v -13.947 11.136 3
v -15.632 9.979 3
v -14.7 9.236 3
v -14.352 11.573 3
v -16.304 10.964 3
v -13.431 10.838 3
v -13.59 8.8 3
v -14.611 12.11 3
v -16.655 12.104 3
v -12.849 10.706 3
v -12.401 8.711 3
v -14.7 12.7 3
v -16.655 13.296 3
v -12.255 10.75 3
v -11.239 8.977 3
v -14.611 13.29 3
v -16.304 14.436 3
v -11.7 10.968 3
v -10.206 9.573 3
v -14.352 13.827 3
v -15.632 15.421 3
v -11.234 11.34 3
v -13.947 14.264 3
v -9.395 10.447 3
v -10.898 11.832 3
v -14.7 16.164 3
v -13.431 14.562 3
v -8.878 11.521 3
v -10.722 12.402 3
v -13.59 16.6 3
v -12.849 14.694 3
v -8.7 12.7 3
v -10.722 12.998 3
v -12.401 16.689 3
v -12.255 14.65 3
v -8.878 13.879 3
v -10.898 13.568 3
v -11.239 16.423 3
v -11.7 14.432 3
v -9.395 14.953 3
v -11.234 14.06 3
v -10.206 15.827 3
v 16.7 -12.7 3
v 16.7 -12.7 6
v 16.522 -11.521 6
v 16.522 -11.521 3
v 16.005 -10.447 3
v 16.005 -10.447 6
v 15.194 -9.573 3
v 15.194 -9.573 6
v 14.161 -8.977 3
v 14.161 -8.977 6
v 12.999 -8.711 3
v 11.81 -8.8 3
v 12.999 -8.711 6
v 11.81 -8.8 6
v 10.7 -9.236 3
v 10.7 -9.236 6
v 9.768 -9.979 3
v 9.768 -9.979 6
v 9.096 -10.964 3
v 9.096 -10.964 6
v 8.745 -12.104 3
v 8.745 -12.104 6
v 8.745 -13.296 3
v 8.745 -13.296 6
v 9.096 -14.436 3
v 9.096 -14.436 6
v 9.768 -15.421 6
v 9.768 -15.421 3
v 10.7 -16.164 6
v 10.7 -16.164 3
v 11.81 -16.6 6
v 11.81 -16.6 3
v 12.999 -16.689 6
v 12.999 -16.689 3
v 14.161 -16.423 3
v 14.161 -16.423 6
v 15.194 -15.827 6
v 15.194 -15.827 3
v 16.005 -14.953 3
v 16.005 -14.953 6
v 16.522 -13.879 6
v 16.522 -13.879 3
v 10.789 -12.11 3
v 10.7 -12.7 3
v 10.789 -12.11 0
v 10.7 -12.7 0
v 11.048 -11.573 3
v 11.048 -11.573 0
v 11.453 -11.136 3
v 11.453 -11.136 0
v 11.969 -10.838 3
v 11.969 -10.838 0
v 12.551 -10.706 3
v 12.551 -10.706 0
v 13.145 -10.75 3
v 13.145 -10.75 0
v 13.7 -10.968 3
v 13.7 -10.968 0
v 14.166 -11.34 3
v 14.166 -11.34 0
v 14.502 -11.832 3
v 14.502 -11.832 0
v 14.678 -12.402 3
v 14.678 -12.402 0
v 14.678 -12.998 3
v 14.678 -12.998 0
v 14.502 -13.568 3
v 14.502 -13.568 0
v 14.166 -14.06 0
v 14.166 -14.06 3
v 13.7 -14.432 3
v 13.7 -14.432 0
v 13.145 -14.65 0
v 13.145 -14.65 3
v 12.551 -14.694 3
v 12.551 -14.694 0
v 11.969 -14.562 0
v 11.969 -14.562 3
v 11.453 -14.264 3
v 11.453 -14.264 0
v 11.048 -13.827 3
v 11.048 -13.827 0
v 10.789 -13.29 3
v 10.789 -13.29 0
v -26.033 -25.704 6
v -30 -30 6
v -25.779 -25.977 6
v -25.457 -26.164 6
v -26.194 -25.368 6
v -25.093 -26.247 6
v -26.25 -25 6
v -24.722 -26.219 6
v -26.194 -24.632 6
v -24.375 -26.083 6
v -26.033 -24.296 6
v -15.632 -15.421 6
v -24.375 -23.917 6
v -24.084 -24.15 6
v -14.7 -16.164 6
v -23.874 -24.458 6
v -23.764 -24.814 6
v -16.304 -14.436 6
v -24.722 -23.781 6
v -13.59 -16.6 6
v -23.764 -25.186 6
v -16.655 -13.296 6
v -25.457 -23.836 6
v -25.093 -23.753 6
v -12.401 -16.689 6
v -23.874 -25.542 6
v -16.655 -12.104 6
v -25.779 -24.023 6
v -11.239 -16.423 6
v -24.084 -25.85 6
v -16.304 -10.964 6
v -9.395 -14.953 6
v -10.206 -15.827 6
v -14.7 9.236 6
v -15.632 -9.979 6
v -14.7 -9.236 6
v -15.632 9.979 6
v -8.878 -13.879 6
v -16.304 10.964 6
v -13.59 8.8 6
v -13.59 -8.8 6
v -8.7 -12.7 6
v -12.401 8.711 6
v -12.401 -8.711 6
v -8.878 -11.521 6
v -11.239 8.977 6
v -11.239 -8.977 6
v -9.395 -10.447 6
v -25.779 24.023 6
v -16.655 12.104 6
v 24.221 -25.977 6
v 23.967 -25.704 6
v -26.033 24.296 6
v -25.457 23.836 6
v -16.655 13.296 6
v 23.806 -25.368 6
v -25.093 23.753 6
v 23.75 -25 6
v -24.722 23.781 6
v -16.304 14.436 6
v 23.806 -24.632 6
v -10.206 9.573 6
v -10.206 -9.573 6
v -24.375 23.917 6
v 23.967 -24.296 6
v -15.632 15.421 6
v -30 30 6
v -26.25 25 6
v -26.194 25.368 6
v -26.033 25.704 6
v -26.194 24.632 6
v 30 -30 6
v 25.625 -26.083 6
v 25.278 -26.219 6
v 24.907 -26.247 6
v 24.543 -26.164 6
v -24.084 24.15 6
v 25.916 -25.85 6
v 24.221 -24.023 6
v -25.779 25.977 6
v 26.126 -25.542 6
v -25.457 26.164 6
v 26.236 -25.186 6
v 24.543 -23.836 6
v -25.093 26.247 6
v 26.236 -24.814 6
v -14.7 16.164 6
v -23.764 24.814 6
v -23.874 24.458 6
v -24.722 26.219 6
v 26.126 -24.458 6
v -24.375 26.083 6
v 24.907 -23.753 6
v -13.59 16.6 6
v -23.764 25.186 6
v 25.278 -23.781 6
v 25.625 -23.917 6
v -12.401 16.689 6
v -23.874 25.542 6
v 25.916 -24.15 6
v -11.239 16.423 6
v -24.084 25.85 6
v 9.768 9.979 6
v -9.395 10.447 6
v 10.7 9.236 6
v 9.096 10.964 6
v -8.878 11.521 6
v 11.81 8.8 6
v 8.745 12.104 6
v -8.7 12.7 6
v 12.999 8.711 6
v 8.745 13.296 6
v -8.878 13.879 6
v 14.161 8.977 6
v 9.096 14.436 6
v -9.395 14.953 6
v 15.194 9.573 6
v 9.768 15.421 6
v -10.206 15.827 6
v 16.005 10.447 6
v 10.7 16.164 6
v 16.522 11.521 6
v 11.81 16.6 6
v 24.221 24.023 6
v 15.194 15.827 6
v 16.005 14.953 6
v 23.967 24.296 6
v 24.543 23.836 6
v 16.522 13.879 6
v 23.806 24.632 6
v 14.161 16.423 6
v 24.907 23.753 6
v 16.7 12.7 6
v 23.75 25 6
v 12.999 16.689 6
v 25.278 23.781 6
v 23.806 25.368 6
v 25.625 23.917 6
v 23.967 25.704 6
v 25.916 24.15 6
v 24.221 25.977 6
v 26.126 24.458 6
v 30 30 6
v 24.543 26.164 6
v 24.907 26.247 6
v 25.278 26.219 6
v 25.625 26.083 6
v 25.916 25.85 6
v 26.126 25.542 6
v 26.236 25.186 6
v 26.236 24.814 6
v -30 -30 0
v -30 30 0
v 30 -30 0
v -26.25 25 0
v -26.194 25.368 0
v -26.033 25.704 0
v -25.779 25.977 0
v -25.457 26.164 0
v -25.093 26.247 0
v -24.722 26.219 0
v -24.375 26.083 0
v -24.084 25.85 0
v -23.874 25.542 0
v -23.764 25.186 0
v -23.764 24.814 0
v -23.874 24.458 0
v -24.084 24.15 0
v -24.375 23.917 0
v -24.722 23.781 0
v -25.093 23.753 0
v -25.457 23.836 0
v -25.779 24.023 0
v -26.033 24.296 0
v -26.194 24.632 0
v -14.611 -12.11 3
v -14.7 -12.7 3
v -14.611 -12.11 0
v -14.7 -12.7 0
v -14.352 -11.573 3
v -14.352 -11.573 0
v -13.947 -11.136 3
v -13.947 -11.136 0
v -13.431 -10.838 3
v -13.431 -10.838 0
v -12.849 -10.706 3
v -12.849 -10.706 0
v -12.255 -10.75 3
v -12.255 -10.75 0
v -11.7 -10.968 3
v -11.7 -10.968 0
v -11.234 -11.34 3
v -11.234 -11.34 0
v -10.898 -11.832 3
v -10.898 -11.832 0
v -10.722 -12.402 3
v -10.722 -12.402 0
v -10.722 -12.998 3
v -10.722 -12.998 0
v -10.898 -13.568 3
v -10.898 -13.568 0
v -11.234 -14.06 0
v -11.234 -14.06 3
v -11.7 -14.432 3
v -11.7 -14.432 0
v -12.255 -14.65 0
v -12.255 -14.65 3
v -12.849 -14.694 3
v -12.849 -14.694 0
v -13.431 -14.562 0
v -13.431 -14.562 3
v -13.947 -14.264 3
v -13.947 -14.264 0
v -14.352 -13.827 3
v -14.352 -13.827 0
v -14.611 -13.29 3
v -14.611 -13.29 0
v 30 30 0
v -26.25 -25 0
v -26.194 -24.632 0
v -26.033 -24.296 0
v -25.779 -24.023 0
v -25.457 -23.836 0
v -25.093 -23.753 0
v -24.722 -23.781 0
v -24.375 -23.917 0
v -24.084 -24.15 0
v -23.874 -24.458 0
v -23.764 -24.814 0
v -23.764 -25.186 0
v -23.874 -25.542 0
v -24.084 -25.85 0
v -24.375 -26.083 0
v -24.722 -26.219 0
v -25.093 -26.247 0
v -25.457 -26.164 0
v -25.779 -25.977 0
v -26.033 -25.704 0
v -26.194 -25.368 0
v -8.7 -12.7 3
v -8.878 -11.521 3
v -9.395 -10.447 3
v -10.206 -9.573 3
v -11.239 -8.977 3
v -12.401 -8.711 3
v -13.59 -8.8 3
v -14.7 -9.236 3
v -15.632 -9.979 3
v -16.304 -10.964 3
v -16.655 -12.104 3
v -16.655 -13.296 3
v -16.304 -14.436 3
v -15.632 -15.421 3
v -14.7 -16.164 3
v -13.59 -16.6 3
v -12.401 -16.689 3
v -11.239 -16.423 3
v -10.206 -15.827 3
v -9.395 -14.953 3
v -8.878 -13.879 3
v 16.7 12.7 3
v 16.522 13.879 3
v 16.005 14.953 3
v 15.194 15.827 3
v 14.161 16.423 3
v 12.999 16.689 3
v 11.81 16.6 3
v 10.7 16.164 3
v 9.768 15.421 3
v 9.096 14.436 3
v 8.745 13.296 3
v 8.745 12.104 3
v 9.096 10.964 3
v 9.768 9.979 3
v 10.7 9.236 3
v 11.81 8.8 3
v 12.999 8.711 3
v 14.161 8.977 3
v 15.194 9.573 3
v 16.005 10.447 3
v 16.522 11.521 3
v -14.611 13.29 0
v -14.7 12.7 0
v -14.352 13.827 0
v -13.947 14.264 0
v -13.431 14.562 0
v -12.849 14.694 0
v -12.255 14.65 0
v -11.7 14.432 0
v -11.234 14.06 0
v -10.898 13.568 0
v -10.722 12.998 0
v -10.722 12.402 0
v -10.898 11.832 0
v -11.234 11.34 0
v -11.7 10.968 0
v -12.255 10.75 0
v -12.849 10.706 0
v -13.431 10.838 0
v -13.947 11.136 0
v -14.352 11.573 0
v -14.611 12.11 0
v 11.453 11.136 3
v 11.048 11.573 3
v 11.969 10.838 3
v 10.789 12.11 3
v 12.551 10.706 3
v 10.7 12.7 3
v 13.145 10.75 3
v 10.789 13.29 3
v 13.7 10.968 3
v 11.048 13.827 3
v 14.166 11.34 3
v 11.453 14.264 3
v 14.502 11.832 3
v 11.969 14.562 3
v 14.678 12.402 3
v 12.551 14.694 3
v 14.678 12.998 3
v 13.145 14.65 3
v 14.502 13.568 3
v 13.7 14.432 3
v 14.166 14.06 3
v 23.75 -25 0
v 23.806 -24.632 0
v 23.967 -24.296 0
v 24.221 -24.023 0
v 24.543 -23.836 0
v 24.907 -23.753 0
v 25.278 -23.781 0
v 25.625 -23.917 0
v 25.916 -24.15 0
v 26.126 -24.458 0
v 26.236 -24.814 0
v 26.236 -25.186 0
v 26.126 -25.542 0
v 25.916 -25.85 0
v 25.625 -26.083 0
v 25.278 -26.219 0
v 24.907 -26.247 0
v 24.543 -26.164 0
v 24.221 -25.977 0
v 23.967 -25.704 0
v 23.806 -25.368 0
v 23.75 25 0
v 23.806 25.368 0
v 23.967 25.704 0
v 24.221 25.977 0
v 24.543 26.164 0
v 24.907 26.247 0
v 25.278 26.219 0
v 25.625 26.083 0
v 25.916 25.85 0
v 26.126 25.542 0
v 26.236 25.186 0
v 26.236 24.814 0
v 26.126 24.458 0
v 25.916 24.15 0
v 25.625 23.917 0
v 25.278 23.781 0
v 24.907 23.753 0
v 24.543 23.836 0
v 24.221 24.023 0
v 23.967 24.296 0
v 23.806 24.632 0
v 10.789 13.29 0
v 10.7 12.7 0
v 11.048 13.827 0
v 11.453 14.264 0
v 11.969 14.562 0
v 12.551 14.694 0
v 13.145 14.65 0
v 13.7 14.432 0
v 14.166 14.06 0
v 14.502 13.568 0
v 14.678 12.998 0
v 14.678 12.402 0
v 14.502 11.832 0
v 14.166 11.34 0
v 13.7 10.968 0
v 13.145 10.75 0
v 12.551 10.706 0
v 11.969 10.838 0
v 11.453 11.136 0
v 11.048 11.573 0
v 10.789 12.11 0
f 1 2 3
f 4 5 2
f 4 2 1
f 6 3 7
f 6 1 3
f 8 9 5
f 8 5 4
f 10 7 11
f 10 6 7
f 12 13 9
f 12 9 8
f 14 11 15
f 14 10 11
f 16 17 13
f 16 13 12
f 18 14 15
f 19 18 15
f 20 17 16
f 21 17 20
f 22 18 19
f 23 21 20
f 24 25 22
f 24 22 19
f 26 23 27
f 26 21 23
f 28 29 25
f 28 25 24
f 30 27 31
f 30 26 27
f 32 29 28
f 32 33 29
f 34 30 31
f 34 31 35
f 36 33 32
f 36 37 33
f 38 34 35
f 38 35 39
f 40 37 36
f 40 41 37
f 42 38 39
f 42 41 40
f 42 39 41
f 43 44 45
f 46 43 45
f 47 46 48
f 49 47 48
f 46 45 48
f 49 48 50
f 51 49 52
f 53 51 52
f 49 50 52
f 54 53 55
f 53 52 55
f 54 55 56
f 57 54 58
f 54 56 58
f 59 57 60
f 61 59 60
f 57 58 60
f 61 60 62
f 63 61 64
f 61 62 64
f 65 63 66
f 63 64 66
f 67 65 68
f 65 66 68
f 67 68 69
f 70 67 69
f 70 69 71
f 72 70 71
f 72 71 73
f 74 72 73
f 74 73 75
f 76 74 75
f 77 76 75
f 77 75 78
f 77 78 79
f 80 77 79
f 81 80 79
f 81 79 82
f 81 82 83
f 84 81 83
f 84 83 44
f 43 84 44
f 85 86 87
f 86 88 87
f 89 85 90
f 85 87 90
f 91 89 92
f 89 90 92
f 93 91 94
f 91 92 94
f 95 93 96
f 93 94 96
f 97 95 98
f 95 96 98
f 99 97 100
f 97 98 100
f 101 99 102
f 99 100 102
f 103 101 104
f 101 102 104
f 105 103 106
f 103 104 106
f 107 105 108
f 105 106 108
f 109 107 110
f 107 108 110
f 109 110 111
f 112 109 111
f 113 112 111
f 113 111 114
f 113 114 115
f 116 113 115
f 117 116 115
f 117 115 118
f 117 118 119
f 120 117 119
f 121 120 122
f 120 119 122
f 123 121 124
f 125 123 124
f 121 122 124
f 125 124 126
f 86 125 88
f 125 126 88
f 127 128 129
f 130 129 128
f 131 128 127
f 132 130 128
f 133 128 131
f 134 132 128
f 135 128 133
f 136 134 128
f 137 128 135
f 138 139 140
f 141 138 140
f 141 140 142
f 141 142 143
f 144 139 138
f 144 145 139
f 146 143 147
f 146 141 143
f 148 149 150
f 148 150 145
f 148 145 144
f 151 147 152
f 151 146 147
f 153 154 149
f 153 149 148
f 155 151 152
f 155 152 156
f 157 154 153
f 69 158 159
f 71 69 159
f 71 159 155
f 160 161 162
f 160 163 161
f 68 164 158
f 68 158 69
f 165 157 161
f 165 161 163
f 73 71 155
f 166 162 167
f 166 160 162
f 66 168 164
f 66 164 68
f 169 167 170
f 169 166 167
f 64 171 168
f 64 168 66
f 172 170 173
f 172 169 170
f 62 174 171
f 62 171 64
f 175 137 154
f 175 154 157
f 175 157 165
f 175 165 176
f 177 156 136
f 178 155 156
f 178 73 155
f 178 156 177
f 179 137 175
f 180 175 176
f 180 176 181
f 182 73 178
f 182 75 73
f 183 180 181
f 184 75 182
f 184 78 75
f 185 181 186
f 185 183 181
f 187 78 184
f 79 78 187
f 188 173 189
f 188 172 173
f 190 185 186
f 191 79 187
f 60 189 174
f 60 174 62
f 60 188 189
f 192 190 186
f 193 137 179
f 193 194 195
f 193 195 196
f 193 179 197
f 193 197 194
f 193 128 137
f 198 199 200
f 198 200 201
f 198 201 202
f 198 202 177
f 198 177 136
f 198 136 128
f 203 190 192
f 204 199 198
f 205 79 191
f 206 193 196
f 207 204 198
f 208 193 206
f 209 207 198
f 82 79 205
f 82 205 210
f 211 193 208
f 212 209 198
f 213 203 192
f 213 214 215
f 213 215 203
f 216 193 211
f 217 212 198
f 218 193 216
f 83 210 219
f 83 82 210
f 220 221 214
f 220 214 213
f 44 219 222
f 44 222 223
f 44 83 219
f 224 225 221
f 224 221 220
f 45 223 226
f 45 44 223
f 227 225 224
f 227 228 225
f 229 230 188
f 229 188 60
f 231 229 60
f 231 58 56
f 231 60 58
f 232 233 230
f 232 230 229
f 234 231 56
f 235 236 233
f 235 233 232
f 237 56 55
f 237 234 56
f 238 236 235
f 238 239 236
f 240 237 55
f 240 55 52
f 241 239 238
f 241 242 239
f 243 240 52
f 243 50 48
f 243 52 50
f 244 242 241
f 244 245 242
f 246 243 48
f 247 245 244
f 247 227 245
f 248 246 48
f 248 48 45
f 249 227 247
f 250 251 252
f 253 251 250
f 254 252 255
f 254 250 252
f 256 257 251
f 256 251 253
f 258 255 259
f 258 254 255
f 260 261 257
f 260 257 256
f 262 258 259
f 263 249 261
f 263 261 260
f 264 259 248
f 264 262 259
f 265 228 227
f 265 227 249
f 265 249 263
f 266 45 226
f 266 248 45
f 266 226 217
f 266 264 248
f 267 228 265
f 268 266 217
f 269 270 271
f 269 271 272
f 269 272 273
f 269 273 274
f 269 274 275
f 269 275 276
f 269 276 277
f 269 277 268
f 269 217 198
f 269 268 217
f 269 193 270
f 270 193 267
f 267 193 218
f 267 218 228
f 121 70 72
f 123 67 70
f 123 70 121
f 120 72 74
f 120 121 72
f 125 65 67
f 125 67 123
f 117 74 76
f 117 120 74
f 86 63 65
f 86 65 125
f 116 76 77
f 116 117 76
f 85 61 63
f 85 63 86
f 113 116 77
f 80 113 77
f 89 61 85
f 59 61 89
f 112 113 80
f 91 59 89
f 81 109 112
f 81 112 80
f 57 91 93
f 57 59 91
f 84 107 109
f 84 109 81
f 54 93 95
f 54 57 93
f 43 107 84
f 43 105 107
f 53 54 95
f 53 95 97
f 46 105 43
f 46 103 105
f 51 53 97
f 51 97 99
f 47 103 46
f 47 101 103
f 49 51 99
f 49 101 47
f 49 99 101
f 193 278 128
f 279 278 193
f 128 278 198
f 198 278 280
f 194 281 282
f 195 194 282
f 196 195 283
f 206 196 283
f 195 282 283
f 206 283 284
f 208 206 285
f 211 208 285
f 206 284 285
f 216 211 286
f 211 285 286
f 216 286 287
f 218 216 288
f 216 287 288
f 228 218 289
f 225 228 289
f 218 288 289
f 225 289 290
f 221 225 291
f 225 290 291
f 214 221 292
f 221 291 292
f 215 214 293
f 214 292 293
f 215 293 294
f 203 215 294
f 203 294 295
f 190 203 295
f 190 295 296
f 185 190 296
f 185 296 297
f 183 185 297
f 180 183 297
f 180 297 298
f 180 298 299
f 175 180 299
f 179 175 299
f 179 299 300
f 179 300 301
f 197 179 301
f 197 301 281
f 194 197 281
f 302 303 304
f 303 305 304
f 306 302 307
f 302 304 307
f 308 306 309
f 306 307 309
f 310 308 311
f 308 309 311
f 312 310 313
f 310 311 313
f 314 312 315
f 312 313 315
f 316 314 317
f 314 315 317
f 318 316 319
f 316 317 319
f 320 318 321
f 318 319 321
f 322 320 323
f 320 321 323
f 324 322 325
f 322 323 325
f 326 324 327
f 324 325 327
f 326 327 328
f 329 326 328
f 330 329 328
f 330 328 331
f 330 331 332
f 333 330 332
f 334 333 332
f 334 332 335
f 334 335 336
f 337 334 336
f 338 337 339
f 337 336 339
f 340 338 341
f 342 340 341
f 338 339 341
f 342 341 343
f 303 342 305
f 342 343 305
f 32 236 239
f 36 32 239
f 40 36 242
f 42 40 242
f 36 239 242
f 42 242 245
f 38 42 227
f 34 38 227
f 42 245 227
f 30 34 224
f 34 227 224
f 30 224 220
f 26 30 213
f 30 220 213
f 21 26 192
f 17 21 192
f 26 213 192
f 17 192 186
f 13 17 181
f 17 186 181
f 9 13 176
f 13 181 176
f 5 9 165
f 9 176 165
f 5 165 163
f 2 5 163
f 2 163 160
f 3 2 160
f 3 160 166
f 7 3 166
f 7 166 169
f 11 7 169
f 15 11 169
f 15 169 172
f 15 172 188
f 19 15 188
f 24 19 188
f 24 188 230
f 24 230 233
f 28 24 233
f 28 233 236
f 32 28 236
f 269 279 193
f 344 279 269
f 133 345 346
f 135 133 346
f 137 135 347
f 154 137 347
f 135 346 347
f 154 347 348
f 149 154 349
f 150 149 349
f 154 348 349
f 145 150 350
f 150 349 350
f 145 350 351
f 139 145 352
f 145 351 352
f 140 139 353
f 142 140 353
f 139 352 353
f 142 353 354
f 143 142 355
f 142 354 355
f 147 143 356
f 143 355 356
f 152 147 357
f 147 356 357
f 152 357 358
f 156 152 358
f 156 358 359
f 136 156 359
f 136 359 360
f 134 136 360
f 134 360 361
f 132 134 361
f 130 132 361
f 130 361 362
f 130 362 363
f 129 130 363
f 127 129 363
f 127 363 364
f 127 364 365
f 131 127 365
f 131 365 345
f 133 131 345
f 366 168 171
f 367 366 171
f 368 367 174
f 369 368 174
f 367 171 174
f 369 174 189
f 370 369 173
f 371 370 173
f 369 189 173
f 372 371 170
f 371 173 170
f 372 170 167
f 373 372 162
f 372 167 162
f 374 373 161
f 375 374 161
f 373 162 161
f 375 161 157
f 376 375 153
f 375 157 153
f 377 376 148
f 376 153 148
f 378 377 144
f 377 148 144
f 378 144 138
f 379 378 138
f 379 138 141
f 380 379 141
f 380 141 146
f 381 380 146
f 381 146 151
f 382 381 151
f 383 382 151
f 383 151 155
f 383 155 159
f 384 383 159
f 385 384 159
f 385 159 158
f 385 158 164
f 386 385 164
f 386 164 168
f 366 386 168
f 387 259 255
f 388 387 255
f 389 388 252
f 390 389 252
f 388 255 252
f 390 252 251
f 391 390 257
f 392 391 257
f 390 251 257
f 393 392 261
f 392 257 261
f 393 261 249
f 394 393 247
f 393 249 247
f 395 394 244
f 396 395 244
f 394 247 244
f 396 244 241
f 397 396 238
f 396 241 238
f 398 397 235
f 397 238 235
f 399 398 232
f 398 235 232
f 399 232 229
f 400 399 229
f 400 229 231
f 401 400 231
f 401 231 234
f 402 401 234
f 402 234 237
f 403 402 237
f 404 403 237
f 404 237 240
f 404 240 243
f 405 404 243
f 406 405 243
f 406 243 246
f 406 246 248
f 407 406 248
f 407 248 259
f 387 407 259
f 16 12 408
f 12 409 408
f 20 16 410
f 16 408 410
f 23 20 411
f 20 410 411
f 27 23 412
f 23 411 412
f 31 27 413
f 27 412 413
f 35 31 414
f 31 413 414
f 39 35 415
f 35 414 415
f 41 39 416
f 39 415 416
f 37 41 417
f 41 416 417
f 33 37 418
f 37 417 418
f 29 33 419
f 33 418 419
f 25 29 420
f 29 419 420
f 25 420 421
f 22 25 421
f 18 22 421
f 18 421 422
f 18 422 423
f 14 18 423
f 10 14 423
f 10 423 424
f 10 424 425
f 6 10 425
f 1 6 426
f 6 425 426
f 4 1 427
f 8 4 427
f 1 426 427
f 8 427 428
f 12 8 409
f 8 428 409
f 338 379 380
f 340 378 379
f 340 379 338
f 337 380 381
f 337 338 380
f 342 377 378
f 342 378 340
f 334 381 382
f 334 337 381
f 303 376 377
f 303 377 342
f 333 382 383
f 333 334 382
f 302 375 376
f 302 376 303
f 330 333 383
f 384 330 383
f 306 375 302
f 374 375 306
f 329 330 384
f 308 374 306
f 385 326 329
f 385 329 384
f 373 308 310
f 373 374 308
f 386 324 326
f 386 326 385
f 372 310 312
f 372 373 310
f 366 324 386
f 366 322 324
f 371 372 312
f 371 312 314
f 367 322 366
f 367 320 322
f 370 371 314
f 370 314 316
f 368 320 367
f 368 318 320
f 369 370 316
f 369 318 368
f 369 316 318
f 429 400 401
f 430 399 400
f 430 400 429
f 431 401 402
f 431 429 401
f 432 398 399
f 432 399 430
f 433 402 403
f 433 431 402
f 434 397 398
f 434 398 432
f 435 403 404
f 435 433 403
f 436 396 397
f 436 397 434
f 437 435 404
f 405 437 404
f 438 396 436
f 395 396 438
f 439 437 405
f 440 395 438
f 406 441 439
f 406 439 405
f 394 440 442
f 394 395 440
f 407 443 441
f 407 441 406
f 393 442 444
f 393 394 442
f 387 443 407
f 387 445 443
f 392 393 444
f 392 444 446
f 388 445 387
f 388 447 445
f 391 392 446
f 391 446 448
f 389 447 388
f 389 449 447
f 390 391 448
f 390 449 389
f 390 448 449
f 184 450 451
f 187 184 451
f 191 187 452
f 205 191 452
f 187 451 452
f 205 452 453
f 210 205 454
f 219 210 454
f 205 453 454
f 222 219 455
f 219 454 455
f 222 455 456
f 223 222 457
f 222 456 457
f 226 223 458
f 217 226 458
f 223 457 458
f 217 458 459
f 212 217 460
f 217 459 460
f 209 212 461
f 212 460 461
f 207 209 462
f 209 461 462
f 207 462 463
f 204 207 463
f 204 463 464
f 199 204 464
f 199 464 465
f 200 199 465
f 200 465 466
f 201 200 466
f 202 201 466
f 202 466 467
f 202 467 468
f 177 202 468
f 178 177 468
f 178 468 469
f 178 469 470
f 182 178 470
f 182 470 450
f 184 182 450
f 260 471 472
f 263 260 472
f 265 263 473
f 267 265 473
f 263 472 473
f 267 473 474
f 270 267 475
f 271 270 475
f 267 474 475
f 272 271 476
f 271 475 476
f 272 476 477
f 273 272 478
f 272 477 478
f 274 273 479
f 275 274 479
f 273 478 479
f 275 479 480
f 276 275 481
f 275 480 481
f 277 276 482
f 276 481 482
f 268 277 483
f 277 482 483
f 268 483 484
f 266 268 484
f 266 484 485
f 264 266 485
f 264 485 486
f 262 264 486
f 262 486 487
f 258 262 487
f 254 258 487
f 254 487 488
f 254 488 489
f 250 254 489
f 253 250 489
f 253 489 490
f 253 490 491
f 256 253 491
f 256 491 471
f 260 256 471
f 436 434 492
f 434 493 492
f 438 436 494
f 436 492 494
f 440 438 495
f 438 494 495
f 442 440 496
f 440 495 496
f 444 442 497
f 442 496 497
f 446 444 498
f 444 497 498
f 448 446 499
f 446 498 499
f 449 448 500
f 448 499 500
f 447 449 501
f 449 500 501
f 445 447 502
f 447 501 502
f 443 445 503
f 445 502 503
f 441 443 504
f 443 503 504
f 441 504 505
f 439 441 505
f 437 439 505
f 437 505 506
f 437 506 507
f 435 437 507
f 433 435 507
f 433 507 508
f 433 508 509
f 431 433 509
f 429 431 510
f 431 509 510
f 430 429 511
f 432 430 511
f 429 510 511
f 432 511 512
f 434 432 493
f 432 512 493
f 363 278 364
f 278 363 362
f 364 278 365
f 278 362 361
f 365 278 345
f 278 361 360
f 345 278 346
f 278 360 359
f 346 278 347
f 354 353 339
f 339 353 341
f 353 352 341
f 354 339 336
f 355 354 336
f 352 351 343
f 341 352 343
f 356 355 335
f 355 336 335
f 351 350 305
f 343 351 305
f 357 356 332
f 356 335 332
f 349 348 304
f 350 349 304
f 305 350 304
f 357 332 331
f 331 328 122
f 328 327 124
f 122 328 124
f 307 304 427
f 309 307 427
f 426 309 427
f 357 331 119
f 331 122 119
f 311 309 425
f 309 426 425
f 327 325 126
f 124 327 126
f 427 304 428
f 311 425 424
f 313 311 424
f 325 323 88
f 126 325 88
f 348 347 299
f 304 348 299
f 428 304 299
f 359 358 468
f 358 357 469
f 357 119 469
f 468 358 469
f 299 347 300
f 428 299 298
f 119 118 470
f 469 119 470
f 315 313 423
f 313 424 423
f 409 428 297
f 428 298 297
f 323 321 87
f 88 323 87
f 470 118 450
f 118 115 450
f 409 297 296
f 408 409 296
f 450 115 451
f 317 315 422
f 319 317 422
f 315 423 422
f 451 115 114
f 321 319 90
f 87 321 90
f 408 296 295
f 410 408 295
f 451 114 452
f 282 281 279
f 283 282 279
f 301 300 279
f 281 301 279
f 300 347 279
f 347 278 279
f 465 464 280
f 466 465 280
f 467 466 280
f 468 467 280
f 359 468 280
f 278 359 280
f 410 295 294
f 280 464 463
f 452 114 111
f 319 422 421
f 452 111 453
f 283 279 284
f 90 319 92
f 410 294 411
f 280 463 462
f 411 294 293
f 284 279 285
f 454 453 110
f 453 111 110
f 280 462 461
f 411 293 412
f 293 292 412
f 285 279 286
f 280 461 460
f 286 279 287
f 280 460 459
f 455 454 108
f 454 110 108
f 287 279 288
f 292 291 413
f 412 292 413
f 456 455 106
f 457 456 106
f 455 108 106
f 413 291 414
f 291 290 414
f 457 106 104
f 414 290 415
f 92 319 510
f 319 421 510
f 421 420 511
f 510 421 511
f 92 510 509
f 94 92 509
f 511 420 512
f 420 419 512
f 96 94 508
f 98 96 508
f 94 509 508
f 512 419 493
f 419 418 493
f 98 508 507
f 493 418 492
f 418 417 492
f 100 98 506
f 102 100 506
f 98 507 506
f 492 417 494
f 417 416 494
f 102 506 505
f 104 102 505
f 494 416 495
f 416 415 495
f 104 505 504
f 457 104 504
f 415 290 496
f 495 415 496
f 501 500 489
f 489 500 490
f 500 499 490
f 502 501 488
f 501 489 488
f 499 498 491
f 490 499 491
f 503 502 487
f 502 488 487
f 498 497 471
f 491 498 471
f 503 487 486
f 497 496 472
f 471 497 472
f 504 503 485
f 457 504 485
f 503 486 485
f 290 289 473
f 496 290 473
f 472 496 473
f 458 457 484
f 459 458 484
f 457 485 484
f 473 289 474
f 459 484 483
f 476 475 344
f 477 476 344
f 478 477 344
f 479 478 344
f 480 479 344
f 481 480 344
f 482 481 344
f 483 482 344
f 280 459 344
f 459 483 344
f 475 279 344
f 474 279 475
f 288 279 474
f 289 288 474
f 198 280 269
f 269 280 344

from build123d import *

# Parameters (mm, degrees)
SKETCH_1_W                = 60
SKETCH_1_H                = 60
EXTRUDE_1_DEPTH           = 6
HOLE_WIZARD_M3_1_D        = 2.5
HOLE_WIZARD_1_D           = 4
HOLE_WIZARD_1_CBORE_D     = 8
HOLE_WIZARD_1_CBORE_DEPTH = 3


with BuildPart() as part:
    # 草图1 → 凸台-拉伸1 (new body)
    with BuildSketch(Plane.XY):
        Rectangle(SKETCH_1_W, SKETCH_1_H)
    extrude(amount=EXTRUDE_1_DEPTH)

    # M3 螺纹孔1 (through all)
    with Locations(Plane(origin=(-25, 25, 6), x_dir=(1, 0, 0), z_dir=(0, 0, 1))):
        with Locations((0, 0), (50, 0), (50, -50), (0, -50)):
            Hole(HOLE_WIZARD_M3_1_D / 2)

    # 孔1 (through all)
    with Locations(Plane(origin=(-12.7, 12.7, 6), x_dir=(1, 0, 0), z_dir=(0, 0, 1))):
        with Locations((0, 0), (25.4, 0), (25.4, -25.4), (0, -25.4)):
            CounterBoreHole(HOLE_WIZARD_1_D / 2, HOLE_WIZARD_1_CBORE_D / 2, HOLE_WIZARD_1_CBORE_DEPTH)


solid = part.part
